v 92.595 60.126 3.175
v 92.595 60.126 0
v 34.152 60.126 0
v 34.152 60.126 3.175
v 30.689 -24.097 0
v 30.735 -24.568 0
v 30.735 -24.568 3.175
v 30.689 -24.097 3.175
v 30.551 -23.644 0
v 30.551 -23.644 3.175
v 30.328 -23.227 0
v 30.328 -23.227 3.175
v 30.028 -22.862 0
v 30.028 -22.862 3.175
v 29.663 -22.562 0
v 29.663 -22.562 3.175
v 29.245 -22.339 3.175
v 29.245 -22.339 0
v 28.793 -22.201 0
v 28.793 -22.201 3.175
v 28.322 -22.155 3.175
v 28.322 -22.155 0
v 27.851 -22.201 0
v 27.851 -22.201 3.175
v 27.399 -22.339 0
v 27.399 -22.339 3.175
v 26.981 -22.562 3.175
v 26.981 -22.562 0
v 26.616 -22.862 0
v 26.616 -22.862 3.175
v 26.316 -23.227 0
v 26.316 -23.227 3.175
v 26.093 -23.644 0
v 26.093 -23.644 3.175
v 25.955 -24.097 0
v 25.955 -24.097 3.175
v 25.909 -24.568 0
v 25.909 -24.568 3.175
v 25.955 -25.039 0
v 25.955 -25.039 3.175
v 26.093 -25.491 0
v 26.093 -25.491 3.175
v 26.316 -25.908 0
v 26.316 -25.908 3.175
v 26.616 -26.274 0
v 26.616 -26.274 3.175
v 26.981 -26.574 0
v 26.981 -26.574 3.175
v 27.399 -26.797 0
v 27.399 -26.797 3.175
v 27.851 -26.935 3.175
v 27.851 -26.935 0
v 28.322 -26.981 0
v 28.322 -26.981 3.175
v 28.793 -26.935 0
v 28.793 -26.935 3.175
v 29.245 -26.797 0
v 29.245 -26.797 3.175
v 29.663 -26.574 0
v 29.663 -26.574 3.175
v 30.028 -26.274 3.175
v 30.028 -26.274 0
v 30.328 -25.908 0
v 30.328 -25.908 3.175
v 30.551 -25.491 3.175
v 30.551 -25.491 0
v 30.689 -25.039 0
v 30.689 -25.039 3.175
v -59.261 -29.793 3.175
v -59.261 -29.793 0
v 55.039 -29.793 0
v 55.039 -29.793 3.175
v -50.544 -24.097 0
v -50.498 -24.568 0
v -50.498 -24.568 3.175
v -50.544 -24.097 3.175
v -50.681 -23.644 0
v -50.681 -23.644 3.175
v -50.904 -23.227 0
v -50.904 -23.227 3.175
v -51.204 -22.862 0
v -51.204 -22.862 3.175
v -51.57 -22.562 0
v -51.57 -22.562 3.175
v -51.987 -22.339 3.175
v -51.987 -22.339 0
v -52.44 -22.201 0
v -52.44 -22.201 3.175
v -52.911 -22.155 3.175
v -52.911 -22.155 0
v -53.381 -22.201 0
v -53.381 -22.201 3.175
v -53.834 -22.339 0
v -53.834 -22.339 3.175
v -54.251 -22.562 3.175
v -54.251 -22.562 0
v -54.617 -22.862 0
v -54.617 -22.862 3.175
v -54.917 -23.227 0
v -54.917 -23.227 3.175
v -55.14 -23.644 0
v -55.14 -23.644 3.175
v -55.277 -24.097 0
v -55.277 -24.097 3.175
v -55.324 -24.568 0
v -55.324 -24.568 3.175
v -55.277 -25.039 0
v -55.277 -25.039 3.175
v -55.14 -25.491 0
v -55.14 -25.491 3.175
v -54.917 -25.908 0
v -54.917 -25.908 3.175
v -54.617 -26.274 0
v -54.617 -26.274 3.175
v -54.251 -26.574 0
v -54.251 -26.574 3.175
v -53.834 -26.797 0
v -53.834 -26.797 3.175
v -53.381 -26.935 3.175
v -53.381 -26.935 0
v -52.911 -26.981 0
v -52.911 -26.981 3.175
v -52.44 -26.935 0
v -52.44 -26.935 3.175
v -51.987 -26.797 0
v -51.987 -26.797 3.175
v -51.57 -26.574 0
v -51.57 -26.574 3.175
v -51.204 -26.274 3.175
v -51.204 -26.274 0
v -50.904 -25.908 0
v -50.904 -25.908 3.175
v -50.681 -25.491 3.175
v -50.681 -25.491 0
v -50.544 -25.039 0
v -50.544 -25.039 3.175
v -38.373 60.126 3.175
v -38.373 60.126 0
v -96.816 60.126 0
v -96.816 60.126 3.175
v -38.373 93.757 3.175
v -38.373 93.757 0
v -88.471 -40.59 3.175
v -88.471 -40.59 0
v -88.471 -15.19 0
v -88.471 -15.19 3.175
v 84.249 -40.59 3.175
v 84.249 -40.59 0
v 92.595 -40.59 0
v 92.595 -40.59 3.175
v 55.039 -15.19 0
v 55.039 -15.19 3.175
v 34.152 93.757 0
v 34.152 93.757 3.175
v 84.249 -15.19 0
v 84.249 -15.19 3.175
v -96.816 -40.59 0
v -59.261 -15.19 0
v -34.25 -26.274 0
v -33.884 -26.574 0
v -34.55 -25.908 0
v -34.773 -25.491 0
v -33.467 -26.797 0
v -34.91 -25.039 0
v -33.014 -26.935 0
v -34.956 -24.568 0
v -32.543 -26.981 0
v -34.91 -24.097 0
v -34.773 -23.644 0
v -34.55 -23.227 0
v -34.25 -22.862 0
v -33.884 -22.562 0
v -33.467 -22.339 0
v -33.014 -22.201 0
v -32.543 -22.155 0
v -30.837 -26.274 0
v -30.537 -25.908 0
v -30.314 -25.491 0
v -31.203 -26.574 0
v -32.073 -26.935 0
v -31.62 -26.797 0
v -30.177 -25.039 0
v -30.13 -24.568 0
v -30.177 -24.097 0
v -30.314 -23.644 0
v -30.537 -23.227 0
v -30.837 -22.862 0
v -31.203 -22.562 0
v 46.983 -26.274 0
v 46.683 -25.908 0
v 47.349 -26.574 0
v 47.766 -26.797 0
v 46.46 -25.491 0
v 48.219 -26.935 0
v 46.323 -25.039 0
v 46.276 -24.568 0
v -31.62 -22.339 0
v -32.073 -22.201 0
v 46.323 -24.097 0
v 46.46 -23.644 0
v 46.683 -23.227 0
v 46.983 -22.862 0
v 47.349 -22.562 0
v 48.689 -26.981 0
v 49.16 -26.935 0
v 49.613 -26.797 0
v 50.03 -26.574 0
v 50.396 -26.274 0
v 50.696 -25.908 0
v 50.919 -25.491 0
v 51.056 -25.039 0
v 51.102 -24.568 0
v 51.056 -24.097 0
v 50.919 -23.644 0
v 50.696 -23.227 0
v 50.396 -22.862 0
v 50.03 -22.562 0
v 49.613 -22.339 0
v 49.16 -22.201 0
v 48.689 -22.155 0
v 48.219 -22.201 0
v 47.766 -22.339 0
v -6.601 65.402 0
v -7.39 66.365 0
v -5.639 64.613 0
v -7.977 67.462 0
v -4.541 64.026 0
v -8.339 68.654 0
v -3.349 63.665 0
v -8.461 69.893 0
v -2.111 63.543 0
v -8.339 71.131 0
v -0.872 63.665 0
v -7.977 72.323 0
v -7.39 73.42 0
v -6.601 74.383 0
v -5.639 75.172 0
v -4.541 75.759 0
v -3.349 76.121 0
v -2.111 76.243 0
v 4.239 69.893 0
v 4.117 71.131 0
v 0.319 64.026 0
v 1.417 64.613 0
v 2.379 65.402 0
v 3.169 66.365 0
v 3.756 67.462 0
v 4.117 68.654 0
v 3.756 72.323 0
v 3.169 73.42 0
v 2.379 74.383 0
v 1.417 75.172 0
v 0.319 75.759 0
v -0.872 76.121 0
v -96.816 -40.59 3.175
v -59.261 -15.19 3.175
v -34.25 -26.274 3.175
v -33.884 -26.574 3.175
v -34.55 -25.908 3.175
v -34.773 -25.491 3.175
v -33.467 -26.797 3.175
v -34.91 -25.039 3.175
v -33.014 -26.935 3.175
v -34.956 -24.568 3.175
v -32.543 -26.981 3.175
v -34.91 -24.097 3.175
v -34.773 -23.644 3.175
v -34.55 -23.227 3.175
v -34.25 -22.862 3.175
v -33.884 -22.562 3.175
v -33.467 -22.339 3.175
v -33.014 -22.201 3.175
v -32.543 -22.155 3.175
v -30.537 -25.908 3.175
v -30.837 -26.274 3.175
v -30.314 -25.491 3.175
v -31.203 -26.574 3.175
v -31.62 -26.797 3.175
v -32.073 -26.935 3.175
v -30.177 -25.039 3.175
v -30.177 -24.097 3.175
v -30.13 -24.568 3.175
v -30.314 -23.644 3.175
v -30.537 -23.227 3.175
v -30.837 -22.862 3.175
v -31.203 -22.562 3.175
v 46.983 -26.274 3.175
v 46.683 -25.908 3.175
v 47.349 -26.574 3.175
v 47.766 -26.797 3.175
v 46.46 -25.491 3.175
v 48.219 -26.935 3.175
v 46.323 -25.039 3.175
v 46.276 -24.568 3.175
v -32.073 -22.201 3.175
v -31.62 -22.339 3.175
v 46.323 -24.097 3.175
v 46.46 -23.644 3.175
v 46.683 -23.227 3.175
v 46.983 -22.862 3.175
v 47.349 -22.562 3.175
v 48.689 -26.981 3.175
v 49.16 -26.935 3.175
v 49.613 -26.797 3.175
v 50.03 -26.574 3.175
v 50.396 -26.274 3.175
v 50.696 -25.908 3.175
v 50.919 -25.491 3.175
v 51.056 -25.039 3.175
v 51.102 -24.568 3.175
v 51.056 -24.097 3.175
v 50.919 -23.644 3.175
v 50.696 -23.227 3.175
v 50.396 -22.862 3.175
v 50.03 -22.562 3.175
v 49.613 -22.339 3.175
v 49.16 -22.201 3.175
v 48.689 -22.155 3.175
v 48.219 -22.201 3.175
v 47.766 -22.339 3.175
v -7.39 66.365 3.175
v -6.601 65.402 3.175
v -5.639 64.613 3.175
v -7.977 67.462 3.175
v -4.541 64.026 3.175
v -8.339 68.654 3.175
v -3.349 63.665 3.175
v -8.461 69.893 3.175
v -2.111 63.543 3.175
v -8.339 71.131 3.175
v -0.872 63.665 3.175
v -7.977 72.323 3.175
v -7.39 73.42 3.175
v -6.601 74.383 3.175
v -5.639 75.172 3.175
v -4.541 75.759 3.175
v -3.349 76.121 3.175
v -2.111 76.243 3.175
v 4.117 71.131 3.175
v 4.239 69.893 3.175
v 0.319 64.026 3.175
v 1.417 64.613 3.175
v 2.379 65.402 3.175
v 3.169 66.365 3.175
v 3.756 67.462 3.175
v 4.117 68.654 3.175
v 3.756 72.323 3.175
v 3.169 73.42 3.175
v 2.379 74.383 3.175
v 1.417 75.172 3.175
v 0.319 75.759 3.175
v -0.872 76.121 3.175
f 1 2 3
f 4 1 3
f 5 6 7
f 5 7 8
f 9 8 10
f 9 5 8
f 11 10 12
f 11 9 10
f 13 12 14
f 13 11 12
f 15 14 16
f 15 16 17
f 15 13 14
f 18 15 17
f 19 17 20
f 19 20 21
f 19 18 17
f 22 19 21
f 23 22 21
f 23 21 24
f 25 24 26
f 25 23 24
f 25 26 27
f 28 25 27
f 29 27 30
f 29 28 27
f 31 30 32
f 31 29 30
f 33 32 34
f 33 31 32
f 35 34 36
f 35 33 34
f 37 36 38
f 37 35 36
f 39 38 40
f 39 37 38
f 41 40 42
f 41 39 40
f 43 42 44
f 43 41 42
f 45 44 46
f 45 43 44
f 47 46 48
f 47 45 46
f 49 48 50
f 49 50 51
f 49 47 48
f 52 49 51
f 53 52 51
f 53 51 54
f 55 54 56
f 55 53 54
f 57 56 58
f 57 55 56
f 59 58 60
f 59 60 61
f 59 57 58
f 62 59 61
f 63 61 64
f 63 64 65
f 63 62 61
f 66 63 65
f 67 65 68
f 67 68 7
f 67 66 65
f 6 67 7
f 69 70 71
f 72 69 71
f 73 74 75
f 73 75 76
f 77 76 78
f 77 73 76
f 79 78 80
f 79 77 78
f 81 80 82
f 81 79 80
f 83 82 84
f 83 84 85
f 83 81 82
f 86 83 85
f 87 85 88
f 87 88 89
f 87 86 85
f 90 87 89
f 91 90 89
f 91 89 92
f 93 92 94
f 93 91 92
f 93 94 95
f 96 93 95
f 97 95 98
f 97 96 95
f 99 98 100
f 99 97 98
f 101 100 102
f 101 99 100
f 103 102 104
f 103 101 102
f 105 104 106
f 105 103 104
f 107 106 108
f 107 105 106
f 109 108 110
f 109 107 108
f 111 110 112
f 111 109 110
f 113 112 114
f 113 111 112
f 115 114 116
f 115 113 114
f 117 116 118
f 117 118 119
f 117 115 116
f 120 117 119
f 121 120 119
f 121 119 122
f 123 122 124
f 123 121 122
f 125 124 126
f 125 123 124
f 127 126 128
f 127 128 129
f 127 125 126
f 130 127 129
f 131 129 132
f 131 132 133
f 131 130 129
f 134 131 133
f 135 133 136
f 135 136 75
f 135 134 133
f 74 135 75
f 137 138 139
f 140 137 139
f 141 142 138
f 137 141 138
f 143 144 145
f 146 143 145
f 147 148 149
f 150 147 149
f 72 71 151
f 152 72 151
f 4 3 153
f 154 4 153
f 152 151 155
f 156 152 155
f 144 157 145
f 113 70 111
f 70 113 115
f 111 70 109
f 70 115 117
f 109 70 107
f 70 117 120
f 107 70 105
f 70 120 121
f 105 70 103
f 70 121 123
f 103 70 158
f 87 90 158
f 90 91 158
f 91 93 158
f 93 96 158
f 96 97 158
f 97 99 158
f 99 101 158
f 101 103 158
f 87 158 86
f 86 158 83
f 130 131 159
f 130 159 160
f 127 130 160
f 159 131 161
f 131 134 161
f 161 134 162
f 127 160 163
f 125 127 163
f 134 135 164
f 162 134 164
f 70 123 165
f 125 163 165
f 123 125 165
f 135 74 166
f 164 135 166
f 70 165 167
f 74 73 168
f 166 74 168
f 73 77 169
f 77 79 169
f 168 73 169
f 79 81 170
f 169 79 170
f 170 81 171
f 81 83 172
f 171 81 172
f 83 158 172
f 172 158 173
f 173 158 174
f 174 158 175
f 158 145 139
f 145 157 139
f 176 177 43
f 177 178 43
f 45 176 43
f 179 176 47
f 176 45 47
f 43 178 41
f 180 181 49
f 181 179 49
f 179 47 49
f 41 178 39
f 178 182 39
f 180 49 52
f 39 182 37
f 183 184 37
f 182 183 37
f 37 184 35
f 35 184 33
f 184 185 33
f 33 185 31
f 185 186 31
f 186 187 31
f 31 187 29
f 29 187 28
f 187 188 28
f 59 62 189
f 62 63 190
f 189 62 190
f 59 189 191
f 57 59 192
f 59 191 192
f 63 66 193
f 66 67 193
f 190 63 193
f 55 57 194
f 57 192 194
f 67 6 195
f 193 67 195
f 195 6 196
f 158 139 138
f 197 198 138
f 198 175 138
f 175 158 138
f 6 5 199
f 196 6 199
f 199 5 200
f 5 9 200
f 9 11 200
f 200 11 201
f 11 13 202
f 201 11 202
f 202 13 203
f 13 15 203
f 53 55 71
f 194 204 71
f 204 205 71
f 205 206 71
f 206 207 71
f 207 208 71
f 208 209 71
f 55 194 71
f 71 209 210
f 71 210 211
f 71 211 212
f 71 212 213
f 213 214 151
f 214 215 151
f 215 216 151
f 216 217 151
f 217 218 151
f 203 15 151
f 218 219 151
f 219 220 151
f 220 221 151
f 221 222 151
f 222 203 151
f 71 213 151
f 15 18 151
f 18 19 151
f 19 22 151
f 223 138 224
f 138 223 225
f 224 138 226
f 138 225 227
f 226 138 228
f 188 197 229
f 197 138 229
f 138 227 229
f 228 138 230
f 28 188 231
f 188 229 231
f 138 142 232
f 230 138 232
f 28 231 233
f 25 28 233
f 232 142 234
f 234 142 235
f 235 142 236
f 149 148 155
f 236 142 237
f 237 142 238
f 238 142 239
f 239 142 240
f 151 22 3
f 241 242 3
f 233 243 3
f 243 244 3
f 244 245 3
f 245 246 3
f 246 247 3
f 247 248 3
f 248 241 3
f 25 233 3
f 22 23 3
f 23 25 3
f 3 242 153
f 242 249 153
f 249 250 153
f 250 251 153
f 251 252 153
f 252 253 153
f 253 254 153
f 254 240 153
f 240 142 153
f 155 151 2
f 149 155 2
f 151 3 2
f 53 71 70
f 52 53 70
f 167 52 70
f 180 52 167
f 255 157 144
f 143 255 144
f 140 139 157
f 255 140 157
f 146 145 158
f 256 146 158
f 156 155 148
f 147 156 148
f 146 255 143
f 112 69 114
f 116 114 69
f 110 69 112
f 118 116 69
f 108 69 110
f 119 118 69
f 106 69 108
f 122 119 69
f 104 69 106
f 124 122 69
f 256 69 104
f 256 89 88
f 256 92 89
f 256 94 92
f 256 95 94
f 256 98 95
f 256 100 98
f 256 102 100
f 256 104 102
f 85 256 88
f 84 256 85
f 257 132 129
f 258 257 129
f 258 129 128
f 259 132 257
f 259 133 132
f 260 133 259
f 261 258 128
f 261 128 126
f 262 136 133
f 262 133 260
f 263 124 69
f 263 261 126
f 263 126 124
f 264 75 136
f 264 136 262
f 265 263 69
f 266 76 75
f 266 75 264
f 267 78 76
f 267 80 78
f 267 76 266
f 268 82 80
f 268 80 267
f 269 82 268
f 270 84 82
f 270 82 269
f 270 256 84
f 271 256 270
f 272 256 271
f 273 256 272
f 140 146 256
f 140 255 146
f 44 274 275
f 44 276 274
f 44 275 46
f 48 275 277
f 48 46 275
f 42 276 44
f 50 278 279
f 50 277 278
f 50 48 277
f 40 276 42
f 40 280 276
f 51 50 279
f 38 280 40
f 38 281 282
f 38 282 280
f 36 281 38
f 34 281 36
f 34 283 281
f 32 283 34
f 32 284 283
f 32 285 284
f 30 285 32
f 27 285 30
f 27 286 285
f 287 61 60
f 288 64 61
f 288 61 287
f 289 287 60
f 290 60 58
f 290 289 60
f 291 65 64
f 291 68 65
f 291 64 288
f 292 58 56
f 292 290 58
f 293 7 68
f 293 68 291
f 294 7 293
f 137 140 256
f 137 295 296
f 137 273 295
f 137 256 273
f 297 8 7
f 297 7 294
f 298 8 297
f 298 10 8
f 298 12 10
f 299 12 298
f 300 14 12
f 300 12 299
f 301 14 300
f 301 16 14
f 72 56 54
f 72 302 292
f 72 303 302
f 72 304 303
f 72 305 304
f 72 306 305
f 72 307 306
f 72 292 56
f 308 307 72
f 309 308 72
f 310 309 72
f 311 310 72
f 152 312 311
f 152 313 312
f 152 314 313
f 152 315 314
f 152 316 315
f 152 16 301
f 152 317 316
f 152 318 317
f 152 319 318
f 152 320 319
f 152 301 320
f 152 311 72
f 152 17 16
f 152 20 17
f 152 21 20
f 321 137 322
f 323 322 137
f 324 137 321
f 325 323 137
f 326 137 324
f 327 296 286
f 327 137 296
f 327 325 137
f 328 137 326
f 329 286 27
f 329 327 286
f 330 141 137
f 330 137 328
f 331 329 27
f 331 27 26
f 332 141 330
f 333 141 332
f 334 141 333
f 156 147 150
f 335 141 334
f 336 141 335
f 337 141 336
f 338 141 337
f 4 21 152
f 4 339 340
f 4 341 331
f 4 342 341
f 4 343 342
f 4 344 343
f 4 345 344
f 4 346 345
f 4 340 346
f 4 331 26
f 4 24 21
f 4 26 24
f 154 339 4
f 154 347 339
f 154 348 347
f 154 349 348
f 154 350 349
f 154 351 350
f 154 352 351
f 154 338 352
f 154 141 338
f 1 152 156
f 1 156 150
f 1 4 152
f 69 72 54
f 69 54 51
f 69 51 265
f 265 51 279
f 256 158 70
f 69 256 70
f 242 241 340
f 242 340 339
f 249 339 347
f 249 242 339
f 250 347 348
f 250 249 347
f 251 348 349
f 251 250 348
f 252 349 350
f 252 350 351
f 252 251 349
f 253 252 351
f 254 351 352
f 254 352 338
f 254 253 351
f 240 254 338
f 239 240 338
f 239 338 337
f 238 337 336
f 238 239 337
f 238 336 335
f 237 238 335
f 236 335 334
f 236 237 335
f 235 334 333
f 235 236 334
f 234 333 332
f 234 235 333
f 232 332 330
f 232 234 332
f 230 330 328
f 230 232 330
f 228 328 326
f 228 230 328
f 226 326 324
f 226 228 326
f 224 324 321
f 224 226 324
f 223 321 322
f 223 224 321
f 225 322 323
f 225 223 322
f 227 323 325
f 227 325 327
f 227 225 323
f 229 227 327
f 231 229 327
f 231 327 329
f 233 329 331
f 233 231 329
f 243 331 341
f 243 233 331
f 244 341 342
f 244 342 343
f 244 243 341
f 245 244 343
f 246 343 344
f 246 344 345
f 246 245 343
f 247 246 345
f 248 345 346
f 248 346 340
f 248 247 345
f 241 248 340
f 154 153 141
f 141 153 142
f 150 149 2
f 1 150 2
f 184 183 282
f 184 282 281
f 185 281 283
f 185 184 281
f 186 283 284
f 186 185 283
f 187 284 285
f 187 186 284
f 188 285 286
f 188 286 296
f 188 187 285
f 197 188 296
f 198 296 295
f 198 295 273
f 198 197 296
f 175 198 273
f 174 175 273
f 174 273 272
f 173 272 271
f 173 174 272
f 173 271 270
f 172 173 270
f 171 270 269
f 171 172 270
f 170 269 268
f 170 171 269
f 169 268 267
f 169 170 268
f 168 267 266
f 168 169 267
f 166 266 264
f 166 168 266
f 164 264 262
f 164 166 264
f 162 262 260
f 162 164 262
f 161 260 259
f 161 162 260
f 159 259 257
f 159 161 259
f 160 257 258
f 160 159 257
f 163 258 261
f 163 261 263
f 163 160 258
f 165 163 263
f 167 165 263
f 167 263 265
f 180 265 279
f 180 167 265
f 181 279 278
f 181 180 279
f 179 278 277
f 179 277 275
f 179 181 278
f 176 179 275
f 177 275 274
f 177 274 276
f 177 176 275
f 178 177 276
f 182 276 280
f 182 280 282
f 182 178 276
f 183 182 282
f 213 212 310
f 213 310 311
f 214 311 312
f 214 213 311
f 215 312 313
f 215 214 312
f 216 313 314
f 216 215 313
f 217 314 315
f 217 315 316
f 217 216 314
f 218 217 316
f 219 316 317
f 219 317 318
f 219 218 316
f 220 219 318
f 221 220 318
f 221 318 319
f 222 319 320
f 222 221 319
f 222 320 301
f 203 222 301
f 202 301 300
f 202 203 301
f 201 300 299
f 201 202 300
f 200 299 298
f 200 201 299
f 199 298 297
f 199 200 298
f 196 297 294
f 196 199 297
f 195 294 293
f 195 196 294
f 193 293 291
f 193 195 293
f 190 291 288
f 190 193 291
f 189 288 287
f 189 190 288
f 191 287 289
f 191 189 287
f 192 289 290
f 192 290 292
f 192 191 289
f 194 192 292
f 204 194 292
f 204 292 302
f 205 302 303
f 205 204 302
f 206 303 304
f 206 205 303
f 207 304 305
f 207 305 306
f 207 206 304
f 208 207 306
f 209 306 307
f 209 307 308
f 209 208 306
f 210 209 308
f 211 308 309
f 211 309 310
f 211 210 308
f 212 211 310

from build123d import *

# Parameters (mm, degrees)
SKETCH1_R           = 2.413
SKETCH1_R_2         = 6.35
BOSS_EXTRUDE1_DEPTH = 3.175


with BuildPart() as part:
    # Sketch1 → Boss-Extrude1 (new body)
    with BuildSketch(Plane.XY):
        Polygon((92.594576982, -6.877947448), (92.594576982, 60.126165821), (34.151950775, 60.126165821), (34.151950775, 93.757031287), (-38.373257593, 93.757031287), (-38.373257593, 60.126165821), (-96.8158838, 60.126165821), (-96.8158838, -6.877947448), (-96.8158838, -40.590224659), (-88.470653409, -40.590224659), (-88.470653409, -15.190224659), (-59.260653409, -15.190224659), (-59.260653409, -29.792684659), (55.039346591, -29.792684659), (55.039346591, -15.190224659), (84.249346591, -15.190224659), (84.249346591, -40.590224659), (92.594576982, -40.590224659), align=None)
        with Locations((48.689346591, -24.567904659)):
            Circle(SKETCH1_R, mode=Mode.SUBTRACT)
        with Locations((28.322015094, -24.567904659)):
            Circle(SKETCH1_R, mode=Mode.SUBTRACT)
        with Locations((-32.543321912, -24.567904659)):
            Circle(SKETCH1_R, mode=Mode.SUBTRACT)
        with Locations((-52.910653409, -24.567904659)):
            Circle(SKETCH1_R, mode=Mode.SUBTRACT)
        with Locations((-2.110653409, 69.892524061)):
            Circle(SKETCH1_R_2, mode=Mode.SUBTRACT)
    extrude(amount=BOSS_EXTRUDE1_DEPTH)


solid = part.part
